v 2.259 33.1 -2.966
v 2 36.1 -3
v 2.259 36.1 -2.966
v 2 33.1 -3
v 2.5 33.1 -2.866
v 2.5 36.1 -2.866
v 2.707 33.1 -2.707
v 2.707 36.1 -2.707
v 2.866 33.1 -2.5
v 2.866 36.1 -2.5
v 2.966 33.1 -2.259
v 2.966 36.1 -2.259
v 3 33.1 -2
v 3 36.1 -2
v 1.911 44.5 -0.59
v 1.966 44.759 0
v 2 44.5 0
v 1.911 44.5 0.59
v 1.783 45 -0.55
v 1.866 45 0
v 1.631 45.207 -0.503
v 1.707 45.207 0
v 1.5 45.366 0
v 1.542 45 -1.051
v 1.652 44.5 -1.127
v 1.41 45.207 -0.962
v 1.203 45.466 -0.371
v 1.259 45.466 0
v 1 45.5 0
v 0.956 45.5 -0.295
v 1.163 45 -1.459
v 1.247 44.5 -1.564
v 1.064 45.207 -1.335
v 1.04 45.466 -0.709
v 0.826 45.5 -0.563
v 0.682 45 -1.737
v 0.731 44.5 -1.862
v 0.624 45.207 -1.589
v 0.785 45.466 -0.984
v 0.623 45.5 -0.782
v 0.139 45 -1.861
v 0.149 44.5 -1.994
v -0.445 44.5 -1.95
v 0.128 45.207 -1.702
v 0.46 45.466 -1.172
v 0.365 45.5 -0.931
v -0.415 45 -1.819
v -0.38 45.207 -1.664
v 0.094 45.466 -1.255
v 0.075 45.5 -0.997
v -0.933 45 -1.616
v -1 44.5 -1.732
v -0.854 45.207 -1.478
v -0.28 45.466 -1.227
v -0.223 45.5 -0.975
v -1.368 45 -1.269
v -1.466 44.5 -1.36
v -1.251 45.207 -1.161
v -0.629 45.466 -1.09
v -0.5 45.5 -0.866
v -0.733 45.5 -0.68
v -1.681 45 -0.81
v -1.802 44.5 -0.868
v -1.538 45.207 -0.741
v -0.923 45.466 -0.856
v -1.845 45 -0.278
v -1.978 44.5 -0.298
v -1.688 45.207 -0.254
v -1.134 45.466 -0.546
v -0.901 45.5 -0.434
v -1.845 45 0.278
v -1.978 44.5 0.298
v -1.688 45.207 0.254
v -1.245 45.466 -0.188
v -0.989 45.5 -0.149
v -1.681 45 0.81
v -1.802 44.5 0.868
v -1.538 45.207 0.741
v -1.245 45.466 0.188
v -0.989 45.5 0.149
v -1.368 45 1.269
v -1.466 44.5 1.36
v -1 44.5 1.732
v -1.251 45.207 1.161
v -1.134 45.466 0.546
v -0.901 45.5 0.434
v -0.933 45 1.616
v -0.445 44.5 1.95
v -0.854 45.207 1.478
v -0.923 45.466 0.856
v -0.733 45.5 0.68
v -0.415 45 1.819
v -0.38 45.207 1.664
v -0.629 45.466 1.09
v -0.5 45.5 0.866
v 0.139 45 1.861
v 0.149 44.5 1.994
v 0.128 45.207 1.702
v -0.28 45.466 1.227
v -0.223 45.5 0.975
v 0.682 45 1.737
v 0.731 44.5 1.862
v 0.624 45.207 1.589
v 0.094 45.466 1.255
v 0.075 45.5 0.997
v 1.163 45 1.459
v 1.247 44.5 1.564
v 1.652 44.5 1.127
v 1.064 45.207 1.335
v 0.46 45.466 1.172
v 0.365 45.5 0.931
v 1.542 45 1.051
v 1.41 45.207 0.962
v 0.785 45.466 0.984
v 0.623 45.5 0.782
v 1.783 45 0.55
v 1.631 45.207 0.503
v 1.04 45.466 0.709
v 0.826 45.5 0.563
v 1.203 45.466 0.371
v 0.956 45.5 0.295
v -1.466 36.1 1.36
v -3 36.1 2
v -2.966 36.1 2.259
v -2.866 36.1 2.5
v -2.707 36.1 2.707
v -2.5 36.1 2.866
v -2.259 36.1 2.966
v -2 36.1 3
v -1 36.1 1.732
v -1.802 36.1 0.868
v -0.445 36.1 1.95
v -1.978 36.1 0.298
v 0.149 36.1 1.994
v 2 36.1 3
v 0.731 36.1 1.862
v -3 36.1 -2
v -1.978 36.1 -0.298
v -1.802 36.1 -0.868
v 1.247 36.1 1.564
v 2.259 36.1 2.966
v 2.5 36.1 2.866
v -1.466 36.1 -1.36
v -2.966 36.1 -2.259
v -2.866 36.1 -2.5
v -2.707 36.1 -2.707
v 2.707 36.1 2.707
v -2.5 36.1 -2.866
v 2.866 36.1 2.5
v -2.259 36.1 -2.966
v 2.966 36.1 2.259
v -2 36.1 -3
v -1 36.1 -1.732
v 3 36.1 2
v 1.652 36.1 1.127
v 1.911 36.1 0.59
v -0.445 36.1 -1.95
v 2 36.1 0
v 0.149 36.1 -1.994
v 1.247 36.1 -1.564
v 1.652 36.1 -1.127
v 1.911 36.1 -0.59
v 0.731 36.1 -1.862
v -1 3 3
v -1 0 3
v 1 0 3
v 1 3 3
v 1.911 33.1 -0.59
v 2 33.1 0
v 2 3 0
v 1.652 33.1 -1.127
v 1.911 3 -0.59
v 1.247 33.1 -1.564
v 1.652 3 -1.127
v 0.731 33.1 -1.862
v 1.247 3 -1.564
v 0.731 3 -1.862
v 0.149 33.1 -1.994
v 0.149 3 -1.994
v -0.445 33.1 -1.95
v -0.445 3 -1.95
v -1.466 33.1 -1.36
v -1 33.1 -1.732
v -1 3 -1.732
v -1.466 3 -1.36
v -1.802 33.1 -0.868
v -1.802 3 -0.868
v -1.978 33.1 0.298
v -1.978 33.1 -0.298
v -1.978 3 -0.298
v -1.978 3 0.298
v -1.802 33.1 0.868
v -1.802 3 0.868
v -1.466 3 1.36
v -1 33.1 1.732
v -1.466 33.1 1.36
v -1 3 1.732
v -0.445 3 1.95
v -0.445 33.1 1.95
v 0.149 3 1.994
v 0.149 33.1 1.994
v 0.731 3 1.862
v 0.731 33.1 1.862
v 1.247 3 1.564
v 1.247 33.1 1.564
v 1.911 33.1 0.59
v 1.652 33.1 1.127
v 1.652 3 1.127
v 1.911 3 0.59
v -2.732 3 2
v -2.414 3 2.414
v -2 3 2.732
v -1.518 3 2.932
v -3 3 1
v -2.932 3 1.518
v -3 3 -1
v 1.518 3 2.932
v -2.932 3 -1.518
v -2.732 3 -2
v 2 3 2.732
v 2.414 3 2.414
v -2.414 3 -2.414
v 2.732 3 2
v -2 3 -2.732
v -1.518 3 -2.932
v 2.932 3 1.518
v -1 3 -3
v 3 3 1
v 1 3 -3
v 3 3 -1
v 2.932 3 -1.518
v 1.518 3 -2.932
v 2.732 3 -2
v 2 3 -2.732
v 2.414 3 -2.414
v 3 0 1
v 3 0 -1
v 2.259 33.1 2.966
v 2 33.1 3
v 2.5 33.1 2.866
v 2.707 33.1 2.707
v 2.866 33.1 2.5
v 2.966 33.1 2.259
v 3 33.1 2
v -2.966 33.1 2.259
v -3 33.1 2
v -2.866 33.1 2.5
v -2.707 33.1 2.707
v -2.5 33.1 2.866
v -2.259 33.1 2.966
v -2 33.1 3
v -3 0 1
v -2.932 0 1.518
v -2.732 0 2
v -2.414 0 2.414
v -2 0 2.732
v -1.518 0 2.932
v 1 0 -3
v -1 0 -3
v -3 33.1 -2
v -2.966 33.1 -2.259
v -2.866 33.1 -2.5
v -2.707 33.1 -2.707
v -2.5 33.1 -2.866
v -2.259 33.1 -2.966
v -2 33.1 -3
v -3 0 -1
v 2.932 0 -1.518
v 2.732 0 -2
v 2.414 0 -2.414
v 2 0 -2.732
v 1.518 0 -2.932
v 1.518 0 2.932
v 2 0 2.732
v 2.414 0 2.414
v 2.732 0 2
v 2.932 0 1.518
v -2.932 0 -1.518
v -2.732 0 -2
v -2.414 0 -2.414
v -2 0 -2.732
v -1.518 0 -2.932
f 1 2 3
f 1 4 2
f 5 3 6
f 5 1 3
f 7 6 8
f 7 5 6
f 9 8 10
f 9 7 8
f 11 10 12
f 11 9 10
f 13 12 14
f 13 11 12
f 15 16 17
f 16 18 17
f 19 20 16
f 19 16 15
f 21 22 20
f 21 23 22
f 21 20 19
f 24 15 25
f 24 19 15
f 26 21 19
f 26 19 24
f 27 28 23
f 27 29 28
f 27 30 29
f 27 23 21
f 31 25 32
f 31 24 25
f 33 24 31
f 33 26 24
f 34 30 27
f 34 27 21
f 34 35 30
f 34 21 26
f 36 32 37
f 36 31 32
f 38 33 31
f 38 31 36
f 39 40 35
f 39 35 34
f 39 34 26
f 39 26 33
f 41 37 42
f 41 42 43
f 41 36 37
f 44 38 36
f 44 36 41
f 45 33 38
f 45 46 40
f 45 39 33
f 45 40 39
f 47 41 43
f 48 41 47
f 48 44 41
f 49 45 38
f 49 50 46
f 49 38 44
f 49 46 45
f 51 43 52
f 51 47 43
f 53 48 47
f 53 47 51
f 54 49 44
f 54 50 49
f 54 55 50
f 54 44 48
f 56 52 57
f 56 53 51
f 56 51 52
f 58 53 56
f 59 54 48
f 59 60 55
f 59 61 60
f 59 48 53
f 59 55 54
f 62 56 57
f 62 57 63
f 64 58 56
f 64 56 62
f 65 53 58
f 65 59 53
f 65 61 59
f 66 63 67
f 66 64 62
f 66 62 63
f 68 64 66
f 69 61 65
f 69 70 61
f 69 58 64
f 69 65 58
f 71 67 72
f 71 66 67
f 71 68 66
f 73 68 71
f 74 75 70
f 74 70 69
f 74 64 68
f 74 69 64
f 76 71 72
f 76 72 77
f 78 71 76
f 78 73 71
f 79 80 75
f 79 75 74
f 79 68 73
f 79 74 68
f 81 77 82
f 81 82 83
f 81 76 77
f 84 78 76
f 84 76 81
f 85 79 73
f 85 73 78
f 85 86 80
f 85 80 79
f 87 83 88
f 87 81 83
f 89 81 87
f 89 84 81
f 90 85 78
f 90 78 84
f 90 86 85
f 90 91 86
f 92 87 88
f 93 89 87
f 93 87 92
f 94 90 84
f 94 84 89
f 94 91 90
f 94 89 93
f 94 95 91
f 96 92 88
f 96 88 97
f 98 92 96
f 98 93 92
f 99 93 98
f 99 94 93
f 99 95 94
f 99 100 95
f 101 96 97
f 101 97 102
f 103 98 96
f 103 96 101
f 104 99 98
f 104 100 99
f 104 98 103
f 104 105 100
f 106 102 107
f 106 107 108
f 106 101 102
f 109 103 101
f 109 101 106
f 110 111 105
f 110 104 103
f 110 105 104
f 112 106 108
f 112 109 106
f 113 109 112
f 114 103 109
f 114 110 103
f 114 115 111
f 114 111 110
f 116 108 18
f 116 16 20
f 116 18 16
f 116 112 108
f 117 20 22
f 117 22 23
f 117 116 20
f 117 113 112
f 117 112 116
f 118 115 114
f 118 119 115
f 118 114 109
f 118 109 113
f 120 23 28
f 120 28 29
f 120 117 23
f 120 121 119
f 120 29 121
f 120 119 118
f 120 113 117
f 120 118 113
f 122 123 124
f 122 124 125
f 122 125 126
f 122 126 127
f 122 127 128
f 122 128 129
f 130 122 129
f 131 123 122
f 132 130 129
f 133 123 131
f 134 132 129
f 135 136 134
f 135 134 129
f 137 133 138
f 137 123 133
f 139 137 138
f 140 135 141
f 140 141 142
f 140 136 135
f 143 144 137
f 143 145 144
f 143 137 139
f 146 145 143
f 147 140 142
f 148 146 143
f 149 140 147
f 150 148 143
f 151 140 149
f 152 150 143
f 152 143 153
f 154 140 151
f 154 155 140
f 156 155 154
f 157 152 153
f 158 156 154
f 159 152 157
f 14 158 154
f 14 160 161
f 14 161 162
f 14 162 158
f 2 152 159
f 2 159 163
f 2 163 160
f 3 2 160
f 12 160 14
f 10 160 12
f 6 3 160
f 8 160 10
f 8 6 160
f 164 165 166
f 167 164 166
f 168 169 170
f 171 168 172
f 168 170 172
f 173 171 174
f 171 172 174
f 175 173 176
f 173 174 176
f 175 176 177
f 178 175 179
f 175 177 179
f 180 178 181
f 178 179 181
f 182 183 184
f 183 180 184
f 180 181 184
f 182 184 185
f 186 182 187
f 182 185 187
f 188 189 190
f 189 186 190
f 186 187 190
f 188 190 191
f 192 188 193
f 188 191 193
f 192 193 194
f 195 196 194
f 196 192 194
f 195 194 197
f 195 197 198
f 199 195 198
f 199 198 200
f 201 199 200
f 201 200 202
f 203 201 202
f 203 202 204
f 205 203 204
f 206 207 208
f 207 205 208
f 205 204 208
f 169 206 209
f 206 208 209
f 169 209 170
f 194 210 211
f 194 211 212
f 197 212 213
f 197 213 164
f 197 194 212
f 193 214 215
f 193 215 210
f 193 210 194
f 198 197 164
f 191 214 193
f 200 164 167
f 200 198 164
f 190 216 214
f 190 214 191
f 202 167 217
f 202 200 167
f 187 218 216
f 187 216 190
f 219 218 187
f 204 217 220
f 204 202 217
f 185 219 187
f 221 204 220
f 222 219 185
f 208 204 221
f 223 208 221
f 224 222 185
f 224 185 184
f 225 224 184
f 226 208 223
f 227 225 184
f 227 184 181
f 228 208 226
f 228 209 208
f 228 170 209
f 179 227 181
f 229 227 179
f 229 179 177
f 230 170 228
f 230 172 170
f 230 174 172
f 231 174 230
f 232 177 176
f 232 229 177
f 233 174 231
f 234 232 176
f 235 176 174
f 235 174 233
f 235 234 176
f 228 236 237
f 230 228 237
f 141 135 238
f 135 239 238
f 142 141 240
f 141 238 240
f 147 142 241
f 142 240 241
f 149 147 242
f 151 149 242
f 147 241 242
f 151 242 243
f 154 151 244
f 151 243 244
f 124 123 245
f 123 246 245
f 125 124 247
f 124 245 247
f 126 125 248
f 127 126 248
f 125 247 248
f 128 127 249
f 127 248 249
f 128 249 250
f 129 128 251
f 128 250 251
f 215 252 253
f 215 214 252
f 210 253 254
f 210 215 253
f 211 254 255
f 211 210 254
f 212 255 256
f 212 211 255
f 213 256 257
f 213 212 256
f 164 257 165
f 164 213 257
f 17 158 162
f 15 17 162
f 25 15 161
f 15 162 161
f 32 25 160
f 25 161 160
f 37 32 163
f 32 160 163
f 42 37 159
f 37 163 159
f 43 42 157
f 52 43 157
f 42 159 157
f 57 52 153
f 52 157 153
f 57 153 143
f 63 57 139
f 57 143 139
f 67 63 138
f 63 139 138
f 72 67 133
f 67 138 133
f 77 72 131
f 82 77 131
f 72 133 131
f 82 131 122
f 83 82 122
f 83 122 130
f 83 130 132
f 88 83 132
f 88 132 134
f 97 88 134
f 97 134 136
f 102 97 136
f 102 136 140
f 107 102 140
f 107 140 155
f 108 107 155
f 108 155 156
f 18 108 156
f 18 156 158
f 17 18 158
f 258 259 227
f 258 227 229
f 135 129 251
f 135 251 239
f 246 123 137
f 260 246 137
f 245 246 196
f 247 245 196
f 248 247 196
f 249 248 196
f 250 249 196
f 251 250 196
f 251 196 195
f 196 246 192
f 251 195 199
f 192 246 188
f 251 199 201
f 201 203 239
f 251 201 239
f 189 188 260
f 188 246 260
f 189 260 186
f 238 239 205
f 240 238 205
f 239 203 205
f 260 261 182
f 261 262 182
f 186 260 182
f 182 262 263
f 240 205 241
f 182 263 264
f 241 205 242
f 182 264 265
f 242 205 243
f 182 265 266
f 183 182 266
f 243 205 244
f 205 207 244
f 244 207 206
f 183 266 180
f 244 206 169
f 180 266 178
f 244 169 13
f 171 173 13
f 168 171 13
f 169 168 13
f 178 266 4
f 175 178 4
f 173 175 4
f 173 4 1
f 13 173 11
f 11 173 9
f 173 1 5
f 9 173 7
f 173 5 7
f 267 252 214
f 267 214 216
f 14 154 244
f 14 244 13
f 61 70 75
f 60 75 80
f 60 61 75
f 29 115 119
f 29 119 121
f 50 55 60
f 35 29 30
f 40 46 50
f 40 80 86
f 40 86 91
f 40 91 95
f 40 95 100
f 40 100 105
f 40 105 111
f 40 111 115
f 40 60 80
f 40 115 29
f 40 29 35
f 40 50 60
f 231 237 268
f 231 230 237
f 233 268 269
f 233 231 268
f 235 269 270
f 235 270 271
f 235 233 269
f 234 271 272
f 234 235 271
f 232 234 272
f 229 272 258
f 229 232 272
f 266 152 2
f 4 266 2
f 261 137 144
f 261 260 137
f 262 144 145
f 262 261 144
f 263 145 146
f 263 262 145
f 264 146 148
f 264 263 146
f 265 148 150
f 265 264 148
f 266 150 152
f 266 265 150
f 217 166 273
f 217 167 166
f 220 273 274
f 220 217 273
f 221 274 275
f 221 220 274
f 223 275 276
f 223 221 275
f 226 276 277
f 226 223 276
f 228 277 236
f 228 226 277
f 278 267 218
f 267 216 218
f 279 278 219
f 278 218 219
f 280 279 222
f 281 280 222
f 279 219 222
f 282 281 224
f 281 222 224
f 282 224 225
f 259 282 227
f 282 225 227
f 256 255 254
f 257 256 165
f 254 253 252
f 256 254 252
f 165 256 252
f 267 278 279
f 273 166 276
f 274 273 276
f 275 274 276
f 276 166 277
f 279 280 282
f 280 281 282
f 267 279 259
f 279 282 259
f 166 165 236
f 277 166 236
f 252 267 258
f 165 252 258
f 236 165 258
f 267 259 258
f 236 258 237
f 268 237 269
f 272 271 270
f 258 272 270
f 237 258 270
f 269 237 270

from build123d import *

# Parameters (mm, degrees)
SKETCH2_W           = 6
SKETCH2_H           = 6
BOSS_EXTRUDE1_DEPTH = 3
FILLET7_R           = 2
SKETCH3_R           = 2
BOSS_EXTRUDE2_DEPTH = 42.5
FILLET9_R           = 1
BOSS_EXTRUDE3_START = -9.4
SKETCH4_W           = 6
SKETCH4_H           = 6
BOSS_EXTRUDE3_DEPTH = 3
FILLET10_R          = 1


with BuildPart() as part:
    # Sketch2 → Boss-Extrude1 (new body)
    with BuildSketch(Plane(origin=(0, 0, 0), x_dir=(1, 0, 0), z_dir=(0, 1, 0))):
        Rectangle(SKETCH2_W, SKETCH2_H)
    extrude(amount=BOSS_EXTRUDE1_DEPTH)

    # Fillet7
    fillet7_edges = [part.edges().sort_by_distance(p)[0] for p in [
        (3, 1.5, 3),
        (-3, 1.5, 3),
        (-3, 1.5, -3),
        (3, 1.5, -3),
    ]]
    fillet(fillet7_edges, radius=FILLET7_R)

    # Sketch3 → Boss-Extrude2 (add)
    with BuildSketch(Plane(origin=(0, 3, 0), x_dir=(1, 0, 0), z_dir=(0, 1, 0))):
        Circle(SKETCH3_R)
    extrude(amount=BOSS_EXTRUDE2_DEPTH)

    # Fillet9
    fillet9_edges = [part.edges().sort_by_distance(p)[0] for p in [
        (-2, 45.5, 0),
    ]]
    fillet(fillet9_edges, radius=FILLET9_R)

    # Sketch4 → Boss-Extrude3 (add)
    with BuildSketch(Plane(origin=(0, 45.5, 0), x_dir=(1, 0, 0), z_dir=(0, 1, 0)).offset(BOSS_EXTRUDE3_START)):
        Rectangle(SKETCH4_W, SKETCH4_H)
    extrude(amount=-BOSS_EXTRUDE3_DEPTH)

    # Fillet10
    fillet10_edges = [part.edges().sort_by_distance(p)[0] for p in [
        (-3, 34.6, 3),
        (-3, 34.6, -3),
        (3, 34.6, -3),
        (3, 34.6, 3),
    ]]
    fillet(fillet10_edges, radius=FILLET10_R)


solid = part.part
